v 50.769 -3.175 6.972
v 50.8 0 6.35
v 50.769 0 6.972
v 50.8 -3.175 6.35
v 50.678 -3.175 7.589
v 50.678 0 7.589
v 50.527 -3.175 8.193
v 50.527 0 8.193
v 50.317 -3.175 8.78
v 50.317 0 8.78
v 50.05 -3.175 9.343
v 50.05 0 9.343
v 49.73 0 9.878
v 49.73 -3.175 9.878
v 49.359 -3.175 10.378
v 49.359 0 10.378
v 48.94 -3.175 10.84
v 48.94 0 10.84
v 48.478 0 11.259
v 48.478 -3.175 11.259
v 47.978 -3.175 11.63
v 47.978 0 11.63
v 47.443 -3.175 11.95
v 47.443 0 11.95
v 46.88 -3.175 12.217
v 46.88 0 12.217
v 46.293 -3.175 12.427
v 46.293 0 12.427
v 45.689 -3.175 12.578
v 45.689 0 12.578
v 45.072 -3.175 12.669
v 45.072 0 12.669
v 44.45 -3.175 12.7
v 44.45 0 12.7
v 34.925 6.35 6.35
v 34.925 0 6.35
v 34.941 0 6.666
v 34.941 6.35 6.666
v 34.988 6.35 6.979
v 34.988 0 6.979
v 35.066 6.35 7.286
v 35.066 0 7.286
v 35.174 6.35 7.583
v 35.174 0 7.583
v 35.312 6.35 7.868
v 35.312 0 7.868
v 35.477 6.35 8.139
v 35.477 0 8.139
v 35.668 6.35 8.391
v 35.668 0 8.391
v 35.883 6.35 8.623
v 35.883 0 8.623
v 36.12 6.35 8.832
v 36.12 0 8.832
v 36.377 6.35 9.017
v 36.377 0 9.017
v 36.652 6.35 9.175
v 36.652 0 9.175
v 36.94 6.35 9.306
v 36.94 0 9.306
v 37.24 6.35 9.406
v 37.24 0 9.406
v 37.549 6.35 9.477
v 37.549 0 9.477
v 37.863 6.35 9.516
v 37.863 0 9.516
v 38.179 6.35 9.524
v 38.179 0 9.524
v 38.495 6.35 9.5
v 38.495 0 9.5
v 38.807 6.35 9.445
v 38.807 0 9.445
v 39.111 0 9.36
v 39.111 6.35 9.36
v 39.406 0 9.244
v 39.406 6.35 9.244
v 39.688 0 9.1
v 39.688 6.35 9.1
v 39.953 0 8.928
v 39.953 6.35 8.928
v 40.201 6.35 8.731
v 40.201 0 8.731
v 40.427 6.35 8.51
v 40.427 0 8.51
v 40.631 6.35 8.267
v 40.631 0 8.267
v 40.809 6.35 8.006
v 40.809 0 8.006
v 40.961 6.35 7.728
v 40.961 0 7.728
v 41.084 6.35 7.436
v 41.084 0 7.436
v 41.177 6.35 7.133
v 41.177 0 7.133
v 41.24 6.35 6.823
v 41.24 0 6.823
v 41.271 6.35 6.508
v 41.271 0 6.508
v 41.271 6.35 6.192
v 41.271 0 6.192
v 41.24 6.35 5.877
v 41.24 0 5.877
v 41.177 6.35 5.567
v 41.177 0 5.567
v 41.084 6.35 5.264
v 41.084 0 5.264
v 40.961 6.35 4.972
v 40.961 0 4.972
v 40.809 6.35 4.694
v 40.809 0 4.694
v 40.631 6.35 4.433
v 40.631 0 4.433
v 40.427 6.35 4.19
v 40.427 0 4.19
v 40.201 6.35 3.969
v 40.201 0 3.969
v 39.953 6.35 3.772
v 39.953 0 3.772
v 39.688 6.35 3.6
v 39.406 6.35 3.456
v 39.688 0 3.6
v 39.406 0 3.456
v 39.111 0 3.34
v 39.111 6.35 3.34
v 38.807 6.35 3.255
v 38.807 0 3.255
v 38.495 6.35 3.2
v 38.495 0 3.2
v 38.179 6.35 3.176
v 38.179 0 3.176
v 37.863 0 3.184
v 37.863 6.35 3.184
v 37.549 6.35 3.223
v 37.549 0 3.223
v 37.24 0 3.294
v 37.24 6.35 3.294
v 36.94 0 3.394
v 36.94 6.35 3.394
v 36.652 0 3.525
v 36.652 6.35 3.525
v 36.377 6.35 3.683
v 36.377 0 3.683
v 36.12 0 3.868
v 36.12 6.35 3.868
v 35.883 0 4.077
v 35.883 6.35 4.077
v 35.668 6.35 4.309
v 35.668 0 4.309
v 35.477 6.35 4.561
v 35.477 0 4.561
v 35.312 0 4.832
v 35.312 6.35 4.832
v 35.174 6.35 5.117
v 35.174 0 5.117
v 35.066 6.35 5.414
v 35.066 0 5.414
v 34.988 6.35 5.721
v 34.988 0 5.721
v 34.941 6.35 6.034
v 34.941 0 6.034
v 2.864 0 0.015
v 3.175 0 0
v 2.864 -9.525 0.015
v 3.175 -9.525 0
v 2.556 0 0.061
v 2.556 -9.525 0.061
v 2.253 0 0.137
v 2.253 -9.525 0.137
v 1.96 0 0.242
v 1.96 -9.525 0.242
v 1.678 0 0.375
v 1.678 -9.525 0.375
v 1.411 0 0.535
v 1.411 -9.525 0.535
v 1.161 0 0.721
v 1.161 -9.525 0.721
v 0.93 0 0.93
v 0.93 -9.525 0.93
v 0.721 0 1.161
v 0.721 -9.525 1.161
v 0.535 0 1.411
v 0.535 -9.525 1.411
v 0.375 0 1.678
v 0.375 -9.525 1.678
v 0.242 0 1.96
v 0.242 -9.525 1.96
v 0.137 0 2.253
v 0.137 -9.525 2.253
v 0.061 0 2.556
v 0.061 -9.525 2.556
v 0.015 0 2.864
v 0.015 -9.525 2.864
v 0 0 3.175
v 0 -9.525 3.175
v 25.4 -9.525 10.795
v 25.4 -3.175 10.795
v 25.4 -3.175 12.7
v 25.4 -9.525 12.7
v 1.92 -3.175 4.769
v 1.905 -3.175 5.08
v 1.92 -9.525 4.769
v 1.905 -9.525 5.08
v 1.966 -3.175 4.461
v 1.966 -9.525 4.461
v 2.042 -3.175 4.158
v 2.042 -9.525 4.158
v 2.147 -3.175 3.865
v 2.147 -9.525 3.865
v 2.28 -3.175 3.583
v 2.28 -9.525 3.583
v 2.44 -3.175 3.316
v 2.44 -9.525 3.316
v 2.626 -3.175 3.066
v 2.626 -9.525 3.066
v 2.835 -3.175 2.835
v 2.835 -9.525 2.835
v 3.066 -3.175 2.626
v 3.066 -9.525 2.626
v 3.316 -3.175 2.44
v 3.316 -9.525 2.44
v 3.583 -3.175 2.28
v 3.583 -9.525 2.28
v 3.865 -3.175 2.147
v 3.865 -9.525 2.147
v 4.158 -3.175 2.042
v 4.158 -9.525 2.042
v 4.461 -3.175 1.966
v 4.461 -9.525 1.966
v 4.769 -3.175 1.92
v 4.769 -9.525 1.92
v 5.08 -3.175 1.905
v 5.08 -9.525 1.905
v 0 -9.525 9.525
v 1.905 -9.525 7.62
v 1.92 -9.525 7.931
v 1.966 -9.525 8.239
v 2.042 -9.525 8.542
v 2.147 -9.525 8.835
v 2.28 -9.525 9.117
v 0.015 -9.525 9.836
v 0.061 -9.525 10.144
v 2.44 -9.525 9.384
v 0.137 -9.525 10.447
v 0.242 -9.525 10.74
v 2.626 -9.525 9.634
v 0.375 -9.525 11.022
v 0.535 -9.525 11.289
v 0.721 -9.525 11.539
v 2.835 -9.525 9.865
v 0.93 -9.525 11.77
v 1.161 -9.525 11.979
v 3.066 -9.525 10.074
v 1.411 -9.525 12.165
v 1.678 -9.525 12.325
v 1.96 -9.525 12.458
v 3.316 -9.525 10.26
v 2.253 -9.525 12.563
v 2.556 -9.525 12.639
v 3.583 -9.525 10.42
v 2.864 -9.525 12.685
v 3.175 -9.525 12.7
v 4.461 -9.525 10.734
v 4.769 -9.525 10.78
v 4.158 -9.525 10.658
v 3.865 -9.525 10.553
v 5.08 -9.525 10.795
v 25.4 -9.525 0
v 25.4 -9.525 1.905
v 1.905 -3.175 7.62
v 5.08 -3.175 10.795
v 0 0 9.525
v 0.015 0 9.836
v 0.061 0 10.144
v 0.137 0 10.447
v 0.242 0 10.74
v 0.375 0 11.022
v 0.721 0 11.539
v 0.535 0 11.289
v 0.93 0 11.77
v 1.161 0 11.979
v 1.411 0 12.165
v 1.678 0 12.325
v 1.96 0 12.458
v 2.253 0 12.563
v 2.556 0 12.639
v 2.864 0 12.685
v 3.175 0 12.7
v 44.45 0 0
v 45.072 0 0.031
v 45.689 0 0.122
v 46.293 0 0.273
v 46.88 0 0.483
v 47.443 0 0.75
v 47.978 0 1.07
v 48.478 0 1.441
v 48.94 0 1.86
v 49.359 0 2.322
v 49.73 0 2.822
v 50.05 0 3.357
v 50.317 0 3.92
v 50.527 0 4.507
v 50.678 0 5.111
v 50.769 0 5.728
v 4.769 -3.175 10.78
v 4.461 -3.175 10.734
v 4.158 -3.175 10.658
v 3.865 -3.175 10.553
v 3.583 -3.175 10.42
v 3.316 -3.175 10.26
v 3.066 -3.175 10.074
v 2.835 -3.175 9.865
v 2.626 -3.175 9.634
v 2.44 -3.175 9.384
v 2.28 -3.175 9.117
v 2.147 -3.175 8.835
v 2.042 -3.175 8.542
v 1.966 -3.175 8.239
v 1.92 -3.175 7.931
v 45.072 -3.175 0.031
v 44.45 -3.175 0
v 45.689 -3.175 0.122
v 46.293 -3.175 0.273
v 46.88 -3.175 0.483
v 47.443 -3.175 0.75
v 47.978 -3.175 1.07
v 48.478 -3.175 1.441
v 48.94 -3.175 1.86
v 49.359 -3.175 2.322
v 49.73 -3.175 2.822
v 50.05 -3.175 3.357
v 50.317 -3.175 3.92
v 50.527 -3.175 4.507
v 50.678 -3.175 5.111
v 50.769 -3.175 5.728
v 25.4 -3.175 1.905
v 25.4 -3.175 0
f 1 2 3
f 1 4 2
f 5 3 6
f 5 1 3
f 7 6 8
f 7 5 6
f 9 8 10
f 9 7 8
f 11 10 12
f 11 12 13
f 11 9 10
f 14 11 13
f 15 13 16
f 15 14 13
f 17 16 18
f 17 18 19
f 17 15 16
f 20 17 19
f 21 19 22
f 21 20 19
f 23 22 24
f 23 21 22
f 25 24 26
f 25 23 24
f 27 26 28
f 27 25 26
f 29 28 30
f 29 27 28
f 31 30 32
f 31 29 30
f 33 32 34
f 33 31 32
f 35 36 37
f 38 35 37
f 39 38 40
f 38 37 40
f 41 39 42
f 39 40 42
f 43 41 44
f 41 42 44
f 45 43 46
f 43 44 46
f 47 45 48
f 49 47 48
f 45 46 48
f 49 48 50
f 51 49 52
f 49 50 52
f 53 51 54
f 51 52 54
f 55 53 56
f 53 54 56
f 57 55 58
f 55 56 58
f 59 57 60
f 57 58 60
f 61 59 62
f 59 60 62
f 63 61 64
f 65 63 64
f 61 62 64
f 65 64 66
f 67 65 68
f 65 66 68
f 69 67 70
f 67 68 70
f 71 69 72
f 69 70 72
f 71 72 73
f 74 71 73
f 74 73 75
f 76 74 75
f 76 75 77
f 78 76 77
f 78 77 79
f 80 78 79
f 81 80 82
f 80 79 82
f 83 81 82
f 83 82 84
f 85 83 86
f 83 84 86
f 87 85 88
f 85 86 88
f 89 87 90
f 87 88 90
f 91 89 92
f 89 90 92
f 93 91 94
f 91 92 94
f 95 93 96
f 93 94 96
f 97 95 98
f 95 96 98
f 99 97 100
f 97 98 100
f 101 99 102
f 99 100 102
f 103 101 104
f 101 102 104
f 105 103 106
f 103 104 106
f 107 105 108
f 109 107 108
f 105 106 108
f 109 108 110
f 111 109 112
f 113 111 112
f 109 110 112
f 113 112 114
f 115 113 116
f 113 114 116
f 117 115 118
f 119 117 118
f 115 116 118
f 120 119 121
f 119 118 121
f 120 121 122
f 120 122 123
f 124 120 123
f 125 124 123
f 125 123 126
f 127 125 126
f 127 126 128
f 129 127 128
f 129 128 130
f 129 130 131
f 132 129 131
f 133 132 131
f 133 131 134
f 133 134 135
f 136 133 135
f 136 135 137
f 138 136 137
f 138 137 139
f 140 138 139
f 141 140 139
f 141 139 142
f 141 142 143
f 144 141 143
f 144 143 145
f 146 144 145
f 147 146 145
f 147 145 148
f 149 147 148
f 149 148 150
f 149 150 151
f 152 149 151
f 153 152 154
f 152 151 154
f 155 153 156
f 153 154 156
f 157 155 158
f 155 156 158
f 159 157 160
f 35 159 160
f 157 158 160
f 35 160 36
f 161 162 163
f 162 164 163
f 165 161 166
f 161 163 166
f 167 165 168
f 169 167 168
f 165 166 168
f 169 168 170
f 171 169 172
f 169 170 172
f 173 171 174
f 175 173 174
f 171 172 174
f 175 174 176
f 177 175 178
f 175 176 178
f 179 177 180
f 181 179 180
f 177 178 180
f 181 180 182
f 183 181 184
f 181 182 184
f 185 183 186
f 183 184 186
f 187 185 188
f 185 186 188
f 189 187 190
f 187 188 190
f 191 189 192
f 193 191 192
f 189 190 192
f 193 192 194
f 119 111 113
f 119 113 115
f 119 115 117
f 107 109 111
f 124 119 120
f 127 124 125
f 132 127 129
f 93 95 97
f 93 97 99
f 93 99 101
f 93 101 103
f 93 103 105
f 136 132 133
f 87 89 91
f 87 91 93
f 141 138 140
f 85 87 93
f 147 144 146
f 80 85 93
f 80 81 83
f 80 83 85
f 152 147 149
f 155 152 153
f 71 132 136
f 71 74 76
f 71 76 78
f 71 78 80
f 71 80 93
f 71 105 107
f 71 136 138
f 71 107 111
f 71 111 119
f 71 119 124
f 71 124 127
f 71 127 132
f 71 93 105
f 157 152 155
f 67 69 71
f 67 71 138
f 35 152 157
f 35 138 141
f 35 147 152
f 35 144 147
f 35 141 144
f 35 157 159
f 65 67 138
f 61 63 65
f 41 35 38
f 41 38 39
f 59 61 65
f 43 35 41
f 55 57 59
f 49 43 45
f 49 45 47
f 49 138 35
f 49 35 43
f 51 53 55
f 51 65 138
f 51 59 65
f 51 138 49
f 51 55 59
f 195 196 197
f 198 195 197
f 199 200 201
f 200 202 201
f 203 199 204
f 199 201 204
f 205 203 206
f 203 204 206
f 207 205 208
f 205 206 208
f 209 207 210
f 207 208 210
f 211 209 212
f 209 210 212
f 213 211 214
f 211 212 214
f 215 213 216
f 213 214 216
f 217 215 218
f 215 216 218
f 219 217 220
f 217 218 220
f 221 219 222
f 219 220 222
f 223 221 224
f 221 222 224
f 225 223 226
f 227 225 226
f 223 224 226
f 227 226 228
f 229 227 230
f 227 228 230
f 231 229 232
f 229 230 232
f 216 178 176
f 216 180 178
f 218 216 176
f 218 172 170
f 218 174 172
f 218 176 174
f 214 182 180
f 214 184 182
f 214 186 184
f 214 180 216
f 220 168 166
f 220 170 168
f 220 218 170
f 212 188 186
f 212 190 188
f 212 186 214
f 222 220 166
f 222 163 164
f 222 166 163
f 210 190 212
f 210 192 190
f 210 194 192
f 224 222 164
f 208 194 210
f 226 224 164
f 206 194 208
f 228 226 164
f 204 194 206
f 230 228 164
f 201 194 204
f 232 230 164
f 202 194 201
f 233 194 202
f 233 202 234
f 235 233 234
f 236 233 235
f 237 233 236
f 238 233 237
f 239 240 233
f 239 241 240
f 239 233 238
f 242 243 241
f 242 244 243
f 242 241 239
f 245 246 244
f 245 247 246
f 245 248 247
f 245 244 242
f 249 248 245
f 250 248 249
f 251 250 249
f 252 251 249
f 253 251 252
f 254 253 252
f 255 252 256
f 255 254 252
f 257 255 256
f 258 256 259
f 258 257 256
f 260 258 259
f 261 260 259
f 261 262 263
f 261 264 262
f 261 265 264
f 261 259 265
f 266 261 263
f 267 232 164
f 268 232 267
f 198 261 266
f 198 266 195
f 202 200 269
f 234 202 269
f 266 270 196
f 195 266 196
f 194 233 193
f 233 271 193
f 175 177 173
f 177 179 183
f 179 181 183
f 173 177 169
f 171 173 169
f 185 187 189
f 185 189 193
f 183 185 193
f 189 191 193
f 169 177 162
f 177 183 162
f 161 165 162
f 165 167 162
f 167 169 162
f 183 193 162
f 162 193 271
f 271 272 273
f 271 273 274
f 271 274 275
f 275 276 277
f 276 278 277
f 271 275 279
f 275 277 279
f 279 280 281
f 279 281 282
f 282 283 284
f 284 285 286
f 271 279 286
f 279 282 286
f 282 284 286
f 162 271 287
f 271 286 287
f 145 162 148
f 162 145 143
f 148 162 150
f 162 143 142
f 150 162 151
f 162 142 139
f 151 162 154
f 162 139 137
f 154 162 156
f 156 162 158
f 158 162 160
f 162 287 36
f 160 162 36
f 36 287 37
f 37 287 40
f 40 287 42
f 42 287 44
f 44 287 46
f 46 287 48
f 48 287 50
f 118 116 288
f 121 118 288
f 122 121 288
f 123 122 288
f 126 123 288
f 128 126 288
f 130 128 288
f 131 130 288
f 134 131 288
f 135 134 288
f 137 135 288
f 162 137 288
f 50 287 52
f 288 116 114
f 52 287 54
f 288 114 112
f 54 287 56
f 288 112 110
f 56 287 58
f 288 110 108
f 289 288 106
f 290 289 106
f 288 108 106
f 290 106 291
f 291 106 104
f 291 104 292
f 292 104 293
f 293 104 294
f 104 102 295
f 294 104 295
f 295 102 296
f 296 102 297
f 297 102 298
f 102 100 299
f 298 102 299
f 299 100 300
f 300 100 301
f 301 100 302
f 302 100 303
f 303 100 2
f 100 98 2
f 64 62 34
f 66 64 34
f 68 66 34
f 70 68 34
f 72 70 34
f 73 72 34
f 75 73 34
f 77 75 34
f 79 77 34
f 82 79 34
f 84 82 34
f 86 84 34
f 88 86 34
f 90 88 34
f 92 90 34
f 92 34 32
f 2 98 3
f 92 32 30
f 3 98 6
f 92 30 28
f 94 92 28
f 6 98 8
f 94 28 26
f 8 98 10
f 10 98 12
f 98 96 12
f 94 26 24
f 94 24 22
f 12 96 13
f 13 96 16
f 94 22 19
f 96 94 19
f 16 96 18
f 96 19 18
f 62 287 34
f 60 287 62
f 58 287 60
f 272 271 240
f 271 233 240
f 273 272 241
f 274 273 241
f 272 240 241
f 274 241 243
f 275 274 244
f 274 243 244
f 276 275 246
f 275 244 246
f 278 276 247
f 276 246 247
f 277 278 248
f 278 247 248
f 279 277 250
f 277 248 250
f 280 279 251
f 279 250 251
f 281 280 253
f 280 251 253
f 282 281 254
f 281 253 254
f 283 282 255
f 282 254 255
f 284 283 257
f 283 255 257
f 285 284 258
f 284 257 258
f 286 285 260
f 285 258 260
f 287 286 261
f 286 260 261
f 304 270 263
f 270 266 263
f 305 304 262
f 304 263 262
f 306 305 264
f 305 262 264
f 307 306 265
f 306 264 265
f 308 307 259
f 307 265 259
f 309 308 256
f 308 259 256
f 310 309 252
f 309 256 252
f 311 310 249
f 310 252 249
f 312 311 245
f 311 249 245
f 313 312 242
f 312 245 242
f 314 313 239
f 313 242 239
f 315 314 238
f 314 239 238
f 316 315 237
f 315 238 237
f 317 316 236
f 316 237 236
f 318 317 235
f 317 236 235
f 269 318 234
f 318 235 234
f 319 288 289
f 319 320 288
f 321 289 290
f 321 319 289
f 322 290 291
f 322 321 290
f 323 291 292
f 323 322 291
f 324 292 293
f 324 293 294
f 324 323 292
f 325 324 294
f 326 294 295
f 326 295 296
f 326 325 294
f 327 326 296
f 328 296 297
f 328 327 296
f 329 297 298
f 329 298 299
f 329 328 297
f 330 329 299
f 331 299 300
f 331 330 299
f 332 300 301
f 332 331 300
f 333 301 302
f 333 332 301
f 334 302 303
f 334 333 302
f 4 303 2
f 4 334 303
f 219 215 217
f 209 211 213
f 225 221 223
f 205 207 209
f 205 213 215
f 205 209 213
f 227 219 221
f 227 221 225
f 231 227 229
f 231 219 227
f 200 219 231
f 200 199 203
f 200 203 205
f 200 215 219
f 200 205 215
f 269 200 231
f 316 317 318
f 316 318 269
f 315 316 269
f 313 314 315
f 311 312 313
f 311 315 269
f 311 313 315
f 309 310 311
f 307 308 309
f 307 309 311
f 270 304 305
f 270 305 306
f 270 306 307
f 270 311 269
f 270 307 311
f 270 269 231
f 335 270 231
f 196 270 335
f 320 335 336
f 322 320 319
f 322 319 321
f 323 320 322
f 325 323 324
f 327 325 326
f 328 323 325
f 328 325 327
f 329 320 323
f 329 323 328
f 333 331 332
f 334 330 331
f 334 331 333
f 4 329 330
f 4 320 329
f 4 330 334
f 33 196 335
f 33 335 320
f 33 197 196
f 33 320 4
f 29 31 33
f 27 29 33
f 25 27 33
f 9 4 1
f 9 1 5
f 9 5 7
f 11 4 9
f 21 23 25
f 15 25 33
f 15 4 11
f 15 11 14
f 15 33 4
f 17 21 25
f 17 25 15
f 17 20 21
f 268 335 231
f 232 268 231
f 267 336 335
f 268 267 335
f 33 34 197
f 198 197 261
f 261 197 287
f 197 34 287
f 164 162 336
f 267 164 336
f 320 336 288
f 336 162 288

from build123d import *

# Parameters (mm, degrees)
F0_W     = 50.8
F0_H     = 12.7
F1_DEPTH = 3.175
F2_R     = 3.175
F3_DEPTH = 6.35
F5_DEPTH = 6.35
F6_R     = 6.34999
F7_R     = 3.175


# Not quite as in the source:
# - a fillet or chamfer is up to 0.001 mm smaller than in the source, because OpenCascade refuses the exact size


with BuildPart() as f1:
    # F0 (on Front) → F1 (new body)
    with BuildSketch(Plane.XZ):
        with Locations((25.4, 6.35)):
            Rectangle(F0_W, F0_H)
    extrude(amount=F1_DEPTH)

    # F2 (on face) → F3 (join)
    with BuildSketch(Plane(origin=(0, 0, 0), x_dir=(-1, 0, 0), z_dir=(0, 1, 0))):
        with Locations((-38.1, 6.35)):
            Circle(F2_R)
    extrude(amount=F3_DEPTH)

    # F4 (on face) → F5 (join)
    with BuildSketch(Plane.XZ.offset(3.175)):
        Polygon((25.4, 10.795), (25.4, 12.7), (0, 12.7), (0, 0), (25.4, 0), (25.4, 1.905), (1.905, 1.905), (1.905, 10.795), align=None)
    extrude(amount=F5_DEPTH)

    # F6 (radius 6.35 in the source; OpenCascade refuses exactly that, so slightly less here)
    f6_edges = [f1.edges().sort_by_distance(p)[0] for p in [
        (50.8, -1.5875, 0),
        (50.8, -1.5875, 12.7),
    ]]
    fillet(f6_edges, radius=F6_R)

    # F7
    f7_edges = [f1.edges().sort_by_distance(p)[0] for p in [
        (0, -4.7625, 12.7),
        (0, -4.7625, 0),
        (1.905, -6.35, 10.795),
        (1.905, -6.35, 1.905),
    ]]
    fillet(f7_edges, radius=F7_R)


solid = f1.part
